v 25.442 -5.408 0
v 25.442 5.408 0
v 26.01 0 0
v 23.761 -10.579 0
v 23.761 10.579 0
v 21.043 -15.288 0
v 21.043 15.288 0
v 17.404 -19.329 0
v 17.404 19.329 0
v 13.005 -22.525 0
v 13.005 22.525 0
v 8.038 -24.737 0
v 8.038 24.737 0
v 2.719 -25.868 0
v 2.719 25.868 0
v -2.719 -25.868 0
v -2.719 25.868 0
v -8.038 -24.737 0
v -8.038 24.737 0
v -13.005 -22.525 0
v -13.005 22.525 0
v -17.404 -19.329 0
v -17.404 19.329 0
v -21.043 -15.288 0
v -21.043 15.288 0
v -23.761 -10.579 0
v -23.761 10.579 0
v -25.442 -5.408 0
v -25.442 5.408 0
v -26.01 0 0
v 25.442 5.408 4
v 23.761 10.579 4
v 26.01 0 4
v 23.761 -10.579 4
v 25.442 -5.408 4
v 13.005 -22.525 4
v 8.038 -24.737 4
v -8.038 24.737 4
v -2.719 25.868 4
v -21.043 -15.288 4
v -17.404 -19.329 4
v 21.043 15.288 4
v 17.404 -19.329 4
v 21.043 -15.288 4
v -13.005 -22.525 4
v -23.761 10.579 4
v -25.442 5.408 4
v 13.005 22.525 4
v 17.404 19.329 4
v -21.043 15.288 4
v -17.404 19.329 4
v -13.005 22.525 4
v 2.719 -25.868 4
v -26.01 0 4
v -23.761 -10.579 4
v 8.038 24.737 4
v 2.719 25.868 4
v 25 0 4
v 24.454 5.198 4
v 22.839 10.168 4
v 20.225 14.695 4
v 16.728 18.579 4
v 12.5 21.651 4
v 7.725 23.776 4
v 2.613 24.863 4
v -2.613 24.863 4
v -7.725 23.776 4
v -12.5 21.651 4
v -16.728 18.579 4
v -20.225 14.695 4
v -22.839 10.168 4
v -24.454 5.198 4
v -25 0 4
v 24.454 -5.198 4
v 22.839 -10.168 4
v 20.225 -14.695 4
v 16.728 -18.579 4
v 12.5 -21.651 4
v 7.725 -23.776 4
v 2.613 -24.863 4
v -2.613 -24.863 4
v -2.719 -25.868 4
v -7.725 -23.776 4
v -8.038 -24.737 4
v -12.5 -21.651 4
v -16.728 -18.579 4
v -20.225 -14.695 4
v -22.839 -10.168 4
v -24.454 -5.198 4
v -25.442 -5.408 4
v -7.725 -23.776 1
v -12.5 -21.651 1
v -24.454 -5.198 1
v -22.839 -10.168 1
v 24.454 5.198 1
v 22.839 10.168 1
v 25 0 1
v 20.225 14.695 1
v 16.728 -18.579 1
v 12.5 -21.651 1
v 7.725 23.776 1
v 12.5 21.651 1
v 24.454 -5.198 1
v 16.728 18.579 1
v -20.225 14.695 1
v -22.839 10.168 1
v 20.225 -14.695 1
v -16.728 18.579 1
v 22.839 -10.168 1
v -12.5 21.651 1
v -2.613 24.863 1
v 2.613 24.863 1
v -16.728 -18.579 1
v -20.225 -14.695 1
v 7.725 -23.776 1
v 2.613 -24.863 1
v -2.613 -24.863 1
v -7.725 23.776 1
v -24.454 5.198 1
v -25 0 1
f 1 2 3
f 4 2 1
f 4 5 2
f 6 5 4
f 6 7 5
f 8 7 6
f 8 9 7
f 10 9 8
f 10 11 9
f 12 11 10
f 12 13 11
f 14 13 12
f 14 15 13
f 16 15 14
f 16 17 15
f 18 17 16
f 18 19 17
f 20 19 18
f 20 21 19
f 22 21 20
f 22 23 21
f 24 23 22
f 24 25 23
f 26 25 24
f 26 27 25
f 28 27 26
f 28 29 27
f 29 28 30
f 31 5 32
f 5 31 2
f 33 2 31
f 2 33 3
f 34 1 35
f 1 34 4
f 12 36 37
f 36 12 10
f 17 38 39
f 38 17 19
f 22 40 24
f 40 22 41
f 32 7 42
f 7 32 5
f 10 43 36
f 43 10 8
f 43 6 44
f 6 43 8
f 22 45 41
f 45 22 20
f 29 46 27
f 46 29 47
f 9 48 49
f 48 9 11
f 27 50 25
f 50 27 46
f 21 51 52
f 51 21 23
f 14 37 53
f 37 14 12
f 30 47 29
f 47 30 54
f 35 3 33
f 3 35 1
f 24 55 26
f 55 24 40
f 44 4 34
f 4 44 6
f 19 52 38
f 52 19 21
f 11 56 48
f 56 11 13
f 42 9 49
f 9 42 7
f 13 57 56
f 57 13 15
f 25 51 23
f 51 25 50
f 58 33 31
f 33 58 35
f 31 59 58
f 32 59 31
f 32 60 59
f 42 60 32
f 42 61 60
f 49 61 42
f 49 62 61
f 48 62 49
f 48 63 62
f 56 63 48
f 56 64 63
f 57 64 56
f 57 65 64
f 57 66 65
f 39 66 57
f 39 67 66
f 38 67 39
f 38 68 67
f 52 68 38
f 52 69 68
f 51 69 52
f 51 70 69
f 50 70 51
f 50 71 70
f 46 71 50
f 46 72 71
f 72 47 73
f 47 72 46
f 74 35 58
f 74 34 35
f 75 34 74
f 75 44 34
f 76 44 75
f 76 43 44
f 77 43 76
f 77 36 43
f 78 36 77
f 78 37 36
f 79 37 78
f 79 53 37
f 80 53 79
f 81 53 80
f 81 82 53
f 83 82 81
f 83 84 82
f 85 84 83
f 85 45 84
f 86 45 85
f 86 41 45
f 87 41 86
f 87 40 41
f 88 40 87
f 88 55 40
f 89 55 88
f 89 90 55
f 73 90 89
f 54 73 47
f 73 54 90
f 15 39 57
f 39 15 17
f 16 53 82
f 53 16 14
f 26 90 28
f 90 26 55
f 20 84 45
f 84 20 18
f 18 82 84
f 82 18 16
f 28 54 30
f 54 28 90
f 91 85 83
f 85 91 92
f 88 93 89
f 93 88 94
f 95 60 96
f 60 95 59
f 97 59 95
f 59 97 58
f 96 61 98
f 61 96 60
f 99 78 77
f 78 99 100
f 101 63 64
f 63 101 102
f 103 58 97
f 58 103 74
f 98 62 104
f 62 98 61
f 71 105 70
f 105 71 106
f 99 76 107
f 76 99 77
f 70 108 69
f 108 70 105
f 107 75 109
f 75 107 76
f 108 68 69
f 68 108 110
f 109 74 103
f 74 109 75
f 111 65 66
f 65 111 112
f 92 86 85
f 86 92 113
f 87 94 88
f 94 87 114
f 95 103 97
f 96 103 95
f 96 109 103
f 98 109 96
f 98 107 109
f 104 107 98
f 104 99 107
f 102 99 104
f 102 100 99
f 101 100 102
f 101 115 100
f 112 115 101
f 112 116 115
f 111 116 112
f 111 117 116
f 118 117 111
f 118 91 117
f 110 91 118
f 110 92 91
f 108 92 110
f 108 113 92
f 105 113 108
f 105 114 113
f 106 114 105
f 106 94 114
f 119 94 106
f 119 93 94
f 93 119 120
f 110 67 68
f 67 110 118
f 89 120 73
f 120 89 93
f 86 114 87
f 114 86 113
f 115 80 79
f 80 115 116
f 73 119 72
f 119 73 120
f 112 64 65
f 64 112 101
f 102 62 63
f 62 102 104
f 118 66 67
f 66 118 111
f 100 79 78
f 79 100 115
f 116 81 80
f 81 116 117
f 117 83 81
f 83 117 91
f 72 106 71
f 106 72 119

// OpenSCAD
// Wrist handlight cover 4 great awesomeness
// Print revision 1

base_radius = 26.01;
base_height = 4;
lilypad_hole_radius = 25;
lilypad_hole_heigth = 7.5;
lilypad_hole_offset_z = 1;

difference(){
		 // base
		 cylinder(base_height, base_radius, base_radius);
		 // lilypad-via + inner magnets
		 translate([0, 0,lilypad_hole_offset_z]){
					cylinder(lilypad_hole_heigth, lilypad_hole_radius, lilypad_hole_radius);
		 }
}
